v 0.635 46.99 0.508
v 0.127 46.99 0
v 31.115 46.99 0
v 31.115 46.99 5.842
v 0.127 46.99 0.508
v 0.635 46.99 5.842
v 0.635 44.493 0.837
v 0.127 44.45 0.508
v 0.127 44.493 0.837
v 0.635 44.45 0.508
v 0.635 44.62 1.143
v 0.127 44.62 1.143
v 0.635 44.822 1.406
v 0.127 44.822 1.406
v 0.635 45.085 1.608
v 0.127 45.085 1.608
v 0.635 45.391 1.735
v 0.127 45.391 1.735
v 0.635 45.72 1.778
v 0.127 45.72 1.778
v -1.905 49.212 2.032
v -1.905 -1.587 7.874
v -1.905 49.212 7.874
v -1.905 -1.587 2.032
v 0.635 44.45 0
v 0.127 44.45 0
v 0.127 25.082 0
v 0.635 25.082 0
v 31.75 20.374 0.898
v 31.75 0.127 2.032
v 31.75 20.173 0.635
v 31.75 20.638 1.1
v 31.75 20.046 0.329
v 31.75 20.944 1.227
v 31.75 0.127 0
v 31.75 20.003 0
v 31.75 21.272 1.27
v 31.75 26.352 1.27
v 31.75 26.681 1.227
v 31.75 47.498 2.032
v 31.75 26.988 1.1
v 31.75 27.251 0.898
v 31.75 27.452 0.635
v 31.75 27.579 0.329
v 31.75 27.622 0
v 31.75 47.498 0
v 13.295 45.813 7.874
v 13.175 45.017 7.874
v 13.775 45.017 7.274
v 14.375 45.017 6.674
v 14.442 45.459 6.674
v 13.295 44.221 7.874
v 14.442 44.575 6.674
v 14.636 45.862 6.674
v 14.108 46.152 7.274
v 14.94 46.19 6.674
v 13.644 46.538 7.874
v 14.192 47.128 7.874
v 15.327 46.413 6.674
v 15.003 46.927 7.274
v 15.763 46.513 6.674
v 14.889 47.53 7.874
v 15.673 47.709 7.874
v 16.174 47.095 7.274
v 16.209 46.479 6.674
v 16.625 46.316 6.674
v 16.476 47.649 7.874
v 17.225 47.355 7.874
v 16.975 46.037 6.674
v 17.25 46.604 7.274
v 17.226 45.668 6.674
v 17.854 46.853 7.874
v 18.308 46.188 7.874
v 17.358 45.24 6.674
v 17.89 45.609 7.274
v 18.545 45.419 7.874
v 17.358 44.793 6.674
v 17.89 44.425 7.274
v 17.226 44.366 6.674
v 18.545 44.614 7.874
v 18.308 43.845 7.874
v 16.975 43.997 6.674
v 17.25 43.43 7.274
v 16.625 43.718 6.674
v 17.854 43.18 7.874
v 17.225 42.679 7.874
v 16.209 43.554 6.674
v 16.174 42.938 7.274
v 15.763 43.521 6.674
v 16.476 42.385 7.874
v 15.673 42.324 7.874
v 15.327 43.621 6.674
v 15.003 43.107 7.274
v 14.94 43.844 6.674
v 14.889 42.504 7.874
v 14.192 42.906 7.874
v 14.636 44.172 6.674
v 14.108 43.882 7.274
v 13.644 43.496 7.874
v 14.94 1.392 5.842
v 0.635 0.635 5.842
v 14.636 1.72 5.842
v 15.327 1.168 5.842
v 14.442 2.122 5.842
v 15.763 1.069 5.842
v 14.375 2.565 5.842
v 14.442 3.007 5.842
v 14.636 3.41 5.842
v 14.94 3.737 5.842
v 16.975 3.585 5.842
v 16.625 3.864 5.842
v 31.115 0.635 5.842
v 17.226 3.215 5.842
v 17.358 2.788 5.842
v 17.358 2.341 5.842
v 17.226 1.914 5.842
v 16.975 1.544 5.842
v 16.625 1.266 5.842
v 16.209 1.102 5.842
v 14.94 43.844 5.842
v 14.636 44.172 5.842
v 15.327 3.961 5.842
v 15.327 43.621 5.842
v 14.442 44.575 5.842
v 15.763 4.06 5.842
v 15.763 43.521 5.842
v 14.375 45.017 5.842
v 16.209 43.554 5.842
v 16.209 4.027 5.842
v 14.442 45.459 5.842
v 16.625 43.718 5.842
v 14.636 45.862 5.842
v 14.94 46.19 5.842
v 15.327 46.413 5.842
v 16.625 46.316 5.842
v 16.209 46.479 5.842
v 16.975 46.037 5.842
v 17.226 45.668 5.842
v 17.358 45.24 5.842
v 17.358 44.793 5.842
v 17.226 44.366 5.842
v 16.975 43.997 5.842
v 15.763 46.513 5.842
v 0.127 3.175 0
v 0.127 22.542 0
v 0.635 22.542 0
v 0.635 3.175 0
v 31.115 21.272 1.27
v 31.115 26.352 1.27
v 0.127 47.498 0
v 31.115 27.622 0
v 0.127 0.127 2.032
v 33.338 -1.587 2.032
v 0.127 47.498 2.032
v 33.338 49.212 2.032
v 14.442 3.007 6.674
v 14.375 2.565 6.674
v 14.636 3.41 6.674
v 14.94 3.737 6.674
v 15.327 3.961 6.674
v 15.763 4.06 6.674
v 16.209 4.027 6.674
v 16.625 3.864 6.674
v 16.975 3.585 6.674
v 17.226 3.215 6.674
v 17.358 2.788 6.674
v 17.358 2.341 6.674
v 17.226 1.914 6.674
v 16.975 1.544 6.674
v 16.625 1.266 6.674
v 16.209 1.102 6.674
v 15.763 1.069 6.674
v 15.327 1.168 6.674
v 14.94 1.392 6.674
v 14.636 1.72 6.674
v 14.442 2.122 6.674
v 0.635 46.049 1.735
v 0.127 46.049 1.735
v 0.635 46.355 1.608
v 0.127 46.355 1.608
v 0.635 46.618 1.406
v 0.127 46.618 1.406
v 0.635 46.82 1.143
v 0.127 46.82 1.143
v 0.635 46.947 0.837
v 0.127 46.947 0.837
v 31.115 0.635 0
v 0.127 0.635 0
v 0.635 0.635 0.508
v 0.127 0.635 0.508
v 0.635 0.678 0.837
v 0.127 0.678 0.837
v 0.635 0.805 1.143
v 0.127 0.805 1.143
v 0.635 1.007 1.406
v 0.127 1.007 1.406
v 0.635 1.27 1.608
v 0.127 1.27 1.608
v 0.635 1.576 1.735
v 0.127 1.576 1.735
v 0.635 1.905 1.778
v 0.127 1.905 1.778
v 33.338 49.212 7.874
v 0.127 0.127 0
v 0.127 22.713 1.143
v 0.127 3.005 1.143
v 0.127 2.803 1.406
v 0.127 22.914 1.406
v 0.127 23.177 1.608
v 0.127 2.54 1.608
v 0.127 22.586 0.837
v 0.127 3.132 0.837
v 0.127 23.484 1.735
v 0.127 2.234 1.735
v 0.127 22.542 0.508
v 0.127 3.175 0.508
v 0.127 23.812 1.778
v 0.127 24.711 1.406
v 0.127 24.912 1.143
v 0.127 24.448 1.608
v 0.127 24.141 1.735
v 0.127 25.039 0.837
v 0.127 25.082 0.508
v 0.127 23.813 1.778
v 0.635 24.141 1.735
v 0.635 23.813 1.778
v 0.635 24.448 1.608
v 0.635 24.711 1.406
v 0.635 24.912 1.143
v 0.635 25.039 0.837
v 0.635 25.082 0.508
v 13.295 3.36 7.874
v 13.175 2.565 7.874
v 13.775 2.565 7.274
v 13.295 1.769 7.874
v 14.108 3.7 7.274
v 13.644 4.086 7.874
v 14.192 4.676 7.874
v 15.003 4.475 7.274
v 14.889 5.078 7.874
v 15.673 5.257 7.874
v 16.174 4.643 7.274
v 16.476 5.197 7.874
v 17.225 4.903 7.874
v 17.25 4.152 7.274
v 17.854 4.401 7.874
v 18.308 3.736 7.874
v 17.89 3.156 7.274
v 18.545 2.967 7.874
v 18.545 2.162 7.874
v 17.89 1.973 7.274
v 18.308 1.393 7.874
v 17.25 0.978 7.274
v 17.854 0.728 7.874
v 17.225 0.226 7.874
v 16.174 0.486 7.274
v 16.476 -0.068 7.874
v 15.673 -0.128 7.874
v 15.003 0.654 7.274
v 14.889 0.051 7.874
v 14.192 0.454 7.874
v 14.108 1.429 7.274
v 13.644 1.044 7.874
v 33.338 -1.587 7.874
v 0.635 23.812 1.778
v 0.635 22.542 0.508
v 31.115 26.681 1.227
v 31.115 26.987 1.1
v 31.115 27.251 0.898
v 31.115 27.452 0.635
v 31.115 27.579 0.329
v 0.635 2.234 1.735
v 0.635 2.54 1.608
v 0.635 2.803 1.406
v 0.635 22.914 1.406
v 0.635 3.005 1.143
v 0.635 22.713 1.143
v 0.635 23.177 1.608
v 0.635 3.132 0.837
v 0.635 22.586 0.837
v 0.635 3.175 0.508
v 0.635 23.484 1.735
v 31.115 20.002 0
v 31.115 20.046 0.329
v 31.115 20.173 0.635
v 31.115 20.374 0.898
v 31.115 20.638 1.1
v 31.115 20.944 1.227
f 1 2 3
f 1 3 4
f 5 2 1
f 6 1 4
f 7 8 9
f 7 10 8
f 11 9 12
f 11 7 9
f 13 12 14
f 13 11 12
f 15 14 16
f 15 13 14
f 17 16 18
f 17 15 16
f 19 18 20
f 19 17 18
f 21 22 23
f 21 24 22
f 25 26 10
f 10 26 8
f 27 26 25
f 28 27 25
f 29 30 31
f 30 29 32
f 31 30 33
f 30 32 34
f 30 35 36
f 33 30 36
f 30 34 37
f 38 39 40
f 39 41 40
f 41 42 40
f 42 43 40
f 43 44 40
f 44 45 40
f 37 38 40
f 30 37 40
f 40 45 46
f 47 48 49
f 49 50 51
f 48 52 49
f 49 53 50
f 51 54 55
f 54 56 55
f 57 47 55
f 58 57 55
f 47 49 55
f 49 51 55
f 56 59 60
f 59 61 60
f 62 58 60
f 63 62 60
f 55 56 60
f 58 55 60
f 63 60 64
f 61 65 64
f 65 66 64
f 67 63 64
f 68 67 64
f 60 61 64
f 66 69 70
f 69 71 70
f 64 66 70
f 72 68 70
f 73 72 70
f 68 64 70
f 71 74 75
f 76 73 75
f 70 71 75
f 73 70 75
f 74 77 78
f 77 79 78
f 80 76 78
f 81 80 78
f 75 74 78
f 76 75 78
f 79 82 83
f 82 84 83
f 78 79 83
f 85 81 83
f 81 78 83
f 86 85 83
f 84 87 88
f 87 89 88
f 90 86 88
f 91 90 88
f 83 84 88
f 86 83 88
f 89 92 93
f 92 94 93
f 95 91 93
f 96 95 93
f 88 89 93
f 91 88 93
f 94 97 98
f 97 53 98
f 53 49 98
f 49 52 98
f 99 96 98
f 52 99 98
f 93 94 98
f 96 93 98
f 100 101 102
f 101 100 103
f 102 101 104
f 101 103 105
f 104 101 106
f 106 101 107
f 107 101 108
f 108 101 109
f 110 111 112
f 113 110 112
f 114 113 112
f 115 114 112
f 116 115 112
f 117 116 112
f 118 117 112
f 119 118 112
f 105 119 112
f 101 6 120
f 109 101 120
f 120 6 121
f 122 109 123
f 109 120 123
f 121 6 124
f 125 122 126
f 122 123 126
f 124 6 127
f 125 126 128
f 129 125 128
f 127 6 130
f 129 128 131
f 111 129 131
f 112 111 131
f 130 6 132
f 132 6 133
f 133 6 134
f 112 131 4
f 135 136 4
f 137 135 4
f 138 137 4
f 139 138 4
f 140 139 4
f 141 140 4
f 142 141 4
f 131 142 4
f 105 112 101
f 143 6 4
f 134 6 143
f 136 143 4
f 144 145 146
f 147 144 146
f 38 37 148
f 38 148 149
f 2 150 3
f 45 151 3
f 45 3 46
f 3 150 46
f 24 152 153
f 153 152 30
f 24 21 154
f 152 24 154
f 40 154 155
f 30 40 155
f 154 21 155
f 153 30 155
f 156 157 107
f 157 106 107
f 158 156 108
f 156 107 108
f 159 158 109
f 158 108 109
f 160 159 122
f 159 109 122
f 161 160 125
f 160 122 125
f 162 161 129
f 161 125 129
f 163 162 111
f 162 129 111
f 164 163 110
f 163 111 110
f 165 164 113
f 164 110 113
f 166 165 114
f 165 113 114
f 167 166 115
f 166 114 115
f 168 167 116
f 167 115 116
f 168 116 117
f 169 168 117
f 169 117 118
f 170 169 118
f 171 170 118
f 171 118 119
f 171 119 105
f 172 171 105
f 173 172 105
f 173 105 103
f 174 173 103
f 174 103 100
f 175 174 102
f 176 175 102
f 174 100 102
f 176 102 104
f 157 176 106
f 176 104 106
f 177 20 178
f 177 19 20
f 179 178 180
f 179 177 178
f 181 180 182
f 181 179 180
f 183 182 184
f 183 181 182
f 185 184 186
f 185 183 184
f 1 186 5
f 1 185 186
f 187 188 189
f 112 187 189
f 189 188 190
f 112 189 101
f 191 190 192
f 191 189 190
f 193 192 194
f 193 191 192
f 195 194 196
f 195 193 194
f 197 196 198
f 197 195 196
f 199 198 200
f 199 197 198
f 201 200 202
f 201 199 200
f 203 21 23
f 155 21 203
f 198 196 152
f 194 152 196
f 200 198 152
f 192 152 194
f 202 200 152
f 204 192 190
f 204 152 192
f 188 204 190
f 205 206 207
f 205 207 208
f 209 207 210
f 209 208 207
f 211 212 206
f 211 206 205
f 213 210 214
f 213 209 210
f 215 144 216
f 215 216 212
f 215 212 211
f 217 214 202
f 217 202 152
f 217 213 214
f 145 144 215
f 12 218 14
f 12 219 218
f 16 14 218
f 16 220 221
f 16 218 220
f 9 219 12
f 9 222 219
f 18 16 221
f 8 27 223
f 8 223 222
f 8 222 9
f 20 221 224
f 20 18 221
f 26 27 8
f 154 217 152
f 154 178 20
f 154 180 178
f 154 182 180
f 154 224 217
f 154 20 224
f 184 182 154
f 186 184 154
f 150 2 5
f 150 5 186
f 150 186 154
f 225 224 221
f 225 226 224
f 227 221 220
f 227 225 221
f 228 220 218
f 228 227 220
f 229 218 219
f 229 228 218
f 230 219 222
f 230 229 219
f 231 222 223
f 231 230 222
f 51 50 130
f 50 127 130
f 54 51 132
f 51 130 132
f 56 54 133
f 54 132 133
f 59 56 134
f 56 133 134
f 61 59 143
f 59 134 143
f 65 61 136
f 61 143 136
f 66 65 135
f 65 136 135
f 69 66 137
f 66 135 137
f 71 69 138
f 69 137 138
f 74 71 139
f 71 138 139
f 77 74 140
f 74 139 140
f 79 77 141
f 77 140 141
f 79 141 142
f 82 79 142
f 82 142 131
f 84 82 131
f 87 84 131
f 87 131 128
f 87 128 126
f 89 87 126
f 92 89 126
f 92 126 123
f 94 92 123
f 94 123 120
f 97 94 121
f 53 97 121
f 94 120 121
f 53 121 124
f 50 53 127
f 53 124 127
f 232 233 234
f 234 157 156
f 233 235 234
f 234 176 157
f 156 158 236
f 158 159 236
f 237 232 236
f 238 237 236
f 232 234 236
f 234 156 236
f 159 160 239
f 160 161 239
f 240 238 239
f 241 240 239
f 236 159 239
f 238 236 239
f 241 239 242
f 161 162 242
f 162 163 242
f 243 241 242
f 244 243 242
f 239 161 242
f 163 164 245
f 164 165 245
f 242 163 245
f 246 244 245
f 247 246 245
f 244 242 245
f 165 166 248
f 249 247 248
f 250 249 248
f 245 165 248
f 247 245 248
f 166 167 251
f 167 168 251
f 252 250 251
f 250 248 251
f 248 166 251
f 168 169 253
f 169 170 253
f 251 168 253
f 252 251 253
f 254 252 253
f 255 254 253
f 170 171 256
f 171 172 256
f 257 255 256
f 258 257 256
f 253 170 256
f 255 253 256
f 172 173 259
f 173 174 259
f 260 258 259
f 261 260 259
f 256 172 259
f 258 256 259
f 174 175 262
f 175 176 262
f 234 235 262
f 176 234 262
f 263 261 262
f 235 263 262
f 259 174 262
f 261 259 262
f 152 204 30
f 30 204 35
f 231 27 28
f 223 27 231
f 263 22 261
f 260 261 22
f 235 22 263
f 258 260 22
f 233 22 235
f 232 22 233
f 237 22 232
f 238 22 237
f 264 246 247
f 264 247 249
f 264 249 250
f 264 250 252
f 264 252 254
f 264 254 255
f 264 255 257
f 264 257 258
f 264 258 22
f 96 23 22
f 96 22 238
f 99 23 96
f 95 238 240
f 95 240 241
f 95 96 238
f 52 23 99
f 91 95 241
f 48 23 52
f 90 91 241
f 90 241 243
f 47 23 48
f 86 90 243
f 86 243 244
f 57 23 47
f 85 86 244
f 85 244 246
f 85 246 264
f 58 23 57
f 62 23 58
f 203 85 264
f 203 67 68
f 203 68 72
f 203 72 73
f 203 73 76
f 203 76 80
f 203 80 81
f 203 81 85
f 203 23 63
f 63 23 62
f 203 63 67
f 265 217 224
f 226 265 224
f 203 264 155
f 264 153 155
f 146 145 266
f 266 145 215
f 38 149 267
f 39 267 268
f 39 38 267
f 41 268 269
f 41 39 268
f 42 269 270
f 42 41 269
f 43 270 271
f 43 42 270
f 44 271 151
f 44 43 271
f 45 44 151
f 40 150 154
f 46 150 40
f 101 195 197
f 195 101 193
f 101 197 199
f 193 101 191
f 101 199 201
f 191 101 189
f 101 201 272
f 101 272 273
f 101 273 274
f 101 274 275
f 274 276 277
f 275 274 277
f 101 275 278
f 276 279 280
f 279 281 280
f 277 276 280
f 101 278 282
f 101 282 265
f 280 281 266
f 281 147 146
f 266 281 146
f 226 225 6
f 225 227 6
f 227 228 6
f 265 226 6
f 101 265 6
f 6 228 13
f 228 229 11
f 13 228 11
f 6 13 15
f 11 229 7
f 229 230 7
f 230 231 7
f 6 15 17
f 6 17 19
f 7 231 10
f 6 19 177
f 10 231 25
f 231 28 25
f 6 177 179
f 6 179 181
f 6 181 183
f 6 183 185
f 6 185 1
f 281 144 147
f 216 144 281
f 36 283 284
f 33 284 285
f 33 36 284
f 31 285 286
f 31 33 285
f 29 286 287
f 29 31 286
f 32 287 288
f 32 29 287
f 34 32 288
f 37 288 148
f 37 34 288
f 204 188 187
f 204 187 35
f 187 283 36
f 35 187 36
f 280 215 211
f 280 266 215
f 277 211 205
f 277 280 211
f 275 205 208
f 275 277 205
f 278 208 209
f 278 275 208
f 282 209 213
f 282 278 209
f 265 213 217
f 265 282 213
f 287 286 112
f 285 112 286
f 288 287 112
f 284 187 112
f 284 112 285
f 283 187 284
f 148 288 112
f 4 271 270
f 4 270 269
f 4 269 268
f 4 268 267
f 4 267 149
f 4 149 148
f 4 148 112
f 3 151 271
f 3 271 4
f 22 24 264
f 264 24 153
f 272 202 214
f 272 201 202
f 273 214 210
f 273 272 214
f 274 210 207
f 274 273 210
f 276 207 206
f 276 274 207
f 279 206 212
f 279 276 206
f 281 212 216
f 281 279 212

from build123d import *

# Parameters (mm, degrees)
SKETCH2_W                                       = 31.623
SKETCH2_H                                       = 47.371
SKETCH2_W_2                                     = 30.48
SKETCH2_H_2                                     = 46.355
BOSS_EXTRUDE1_DEPTH                             = 2.032
SKETCH3_W                                       = 35.2425
SKETCH3_H                                       = 50.8
SKETCH3_W_2                                     = 30.48
SKETCH3_H_2                                     = 46.355
BOSS_EXTRUDE2_DEPTH                             = 3.81
SKETCH4_W                                       = 35.2425
SKETCH4_H                                       = 50.8
BOSS_EXTRUDE3_DEPTH                             = 2.032
CUT_EXTRUDE1_REACH                              = 62.138
CUT_EXTRUDE2_REACH                              = 61.89
SKETCH6_W                                       = 1.778
SKETCH6_H                                       = 2.54
FILLET1_R                                       = 1.27
CSK_FOR_M3_FLAT_HEAD_MACHINE_SCREW1_D           = 3
CSK_FOR_M3_FLAT_HEAD_MACHINE_SCREW1_CSINK_D     = 5.4
CSK_FOR_M3_FLAT_HEAD_MACHINE_SCREW1_CSINK_ANGLE = 90


with BuildPart() as part:
    # Sketch2 → Boss-Extrude1 (new body)
    with BuildSketch(Plane.XY):
        with Locations((15.9385, 23.8125)):
            Rectangle(SKETCH2_W, SKETCH2_H)
        with Locations((15.875, 23.8125)):
            Rectangle(SKETCH2_W_2, SKETCH2_H_2, mode=Mode.SUBTRACT)
    extrude(amount=BOSS_EXTRUDE1_DEPTH)

    # Sketch3 → Boss-Extrude2 (add)
    with BuildSketch(Plane.XY.offset(2.032)):
        with Locations((15.71625, 23.8125)):
            Rectangle(SKETCH3_W, SKETCH3_H)
        with Locations((15.875, 23.8125)):
            Rectangle(SKETCH3_W_2, SKETCH3_H_2, mode=Mode.SUBTRACT)
    extrude(amount=BOSS_EXTRUDE2_DEPTH)

    # Sketch4 → Boss-Extrude3 (add)
    with BuildSketch(Plane.XY.offset(5.842)):
        with Locations((15.71625, 23.8125)):
            Rectangle(SKETCH4_W, SKETCH4_H)
    extrude(amount=BOSS_EXTRUDE3_DEPTH)

    # Sketch5 → Cut-Extrude1 (cut, up to next)
    with BuildSketch(Plane(origin=(31.75, 0, 0), x_dir=(0, 0, -1), z_dir=(1, 0, 0)), mode=Mode.PRIVATE) as cut_extrude1_sk1:
        with BuildLine():
            Line((1.27, 26.3525), (1.27, 21.2725))
            ThreePointArc((1.27, 21.2725), (0, 20.0025), (-1.27, 21.2725))
            Line((-1.27, 21.2725), (-1.27, 26.3525))
            ThreePointArc((-1.27, 26.3525), (0, 27.6225), (1.27, 26.3525))
        make_face()
    cut_extrude1_tool1 = extrude(cut_extrude1_sk1.sketch, amount=-CUT_EXTRUDE1_REACH, mode=Mode.PRIVATE) & part.part
    add(cut_extrude1_tool1.solids().sort_by_distance((31.75, 23.8125, 0))[0], mode=Mode.SUBTRACT)

    # Sketch6 → Cut-Extrude2 (cut, up to next)
    with BuildSketch(Plane.ZY.offset(-0.127), mode=Mode.PRIVATE) as cut_extrude2_sk1:
        with Locations((0.889, 45.72)):
            Rectangle(SKETCH6_W, SKETCH6_H)
    cut_extrude2_tool1 = extrude(cut_extrude2_sk1.sketch, amount=-CUT_EXTRUDE2_REACH, mode=Mode.PRIVATE) & part.part
    # Sketch6 → Cut-Extrude2 (cut, up to next)
    with BuildSketch(Plane.ZY.offset(-0.127), mode=Mode.PRIVATE) as cut_extrude2_sk2:
        with Locations((0.889, 1.905)):
            Rectangle(SKETCH6_W, SKETCH6_H)
    cut_extrude2_tool2 = extrude(cut_extrude2_sk2.sketch, amount=-CUT_EXTRUDE2_REACH, mode=Mode.PRIVATE) & part.part
    # Sketch6 → Cut-Extrude2 (cut, up to next)
    with BuildSketch(Plane.ZY.offset(-0.127), mode=Mode.PRIVATE) as cut_extrude2_sk3:
        with Locations((0.889, 23.8125)):
            Rectangle(SKETCH6_W, SKETCH6_H)
    cut_extrude2_tool3 = extrude(cut_extrude2_sk3.sketch, amount=-CUT_EXTRUDE2_REACH, mode=Mode.PRIVATE) & part.part
    add(cut_extrude2_tool1.solids().sort_by_distance((0.127, 45.72, 0.889))[0], mode=Mode.SUBTRACT)
    add(cut_extrude2_tool2.solids().sort_by_distance((0.127, 1.905, 0.889))[0], mode=Mode.SUBTRACT)
    add(cut_extrude2_tool3.solids().sort_by_distance((0.127, 23.8125, 0.889))[0], mode=Mode.SUBTRACT)

    # Fillet1
    fillet1_edges = [part.edges().sort_by_distance(p)[0] for p in [
        (0.381, 3.175, 1.778),
        (0.381, 0.635, 1.778),
        (0.381, 22.5425, 1.778),
        (0.381, 25.0825, 1.778),
        (0.381, 46.99, 1.778),
        (0.381, 44.45, 1.778),
    ]]
    fillet(fillet1_edges, radius=FILLET1_R - 0.0001)  # a hair under: the kernel refuses the full size

    # CSK for M3 Flat Head Machine Screw1 (through all)
    with Locations(Plane.XY.offset(7.874)):
        with Locations((15.875, 2.564617431), (15.875, 45.016869066)):
            CounterSinkHole(CSK_FOR_M3_FLAT_HEAD_MACHINE_SCREW1_D / 2, CSK_FOR_M3_FLAT_HEAD_MACHINE_SCREW1_CSINK_D / 2, counter_sink_angle=CSK_FOR_M3_FLAT_HEAD_MACHINE_SCREW1_CSINK_ANGLE)


solid = part.part
